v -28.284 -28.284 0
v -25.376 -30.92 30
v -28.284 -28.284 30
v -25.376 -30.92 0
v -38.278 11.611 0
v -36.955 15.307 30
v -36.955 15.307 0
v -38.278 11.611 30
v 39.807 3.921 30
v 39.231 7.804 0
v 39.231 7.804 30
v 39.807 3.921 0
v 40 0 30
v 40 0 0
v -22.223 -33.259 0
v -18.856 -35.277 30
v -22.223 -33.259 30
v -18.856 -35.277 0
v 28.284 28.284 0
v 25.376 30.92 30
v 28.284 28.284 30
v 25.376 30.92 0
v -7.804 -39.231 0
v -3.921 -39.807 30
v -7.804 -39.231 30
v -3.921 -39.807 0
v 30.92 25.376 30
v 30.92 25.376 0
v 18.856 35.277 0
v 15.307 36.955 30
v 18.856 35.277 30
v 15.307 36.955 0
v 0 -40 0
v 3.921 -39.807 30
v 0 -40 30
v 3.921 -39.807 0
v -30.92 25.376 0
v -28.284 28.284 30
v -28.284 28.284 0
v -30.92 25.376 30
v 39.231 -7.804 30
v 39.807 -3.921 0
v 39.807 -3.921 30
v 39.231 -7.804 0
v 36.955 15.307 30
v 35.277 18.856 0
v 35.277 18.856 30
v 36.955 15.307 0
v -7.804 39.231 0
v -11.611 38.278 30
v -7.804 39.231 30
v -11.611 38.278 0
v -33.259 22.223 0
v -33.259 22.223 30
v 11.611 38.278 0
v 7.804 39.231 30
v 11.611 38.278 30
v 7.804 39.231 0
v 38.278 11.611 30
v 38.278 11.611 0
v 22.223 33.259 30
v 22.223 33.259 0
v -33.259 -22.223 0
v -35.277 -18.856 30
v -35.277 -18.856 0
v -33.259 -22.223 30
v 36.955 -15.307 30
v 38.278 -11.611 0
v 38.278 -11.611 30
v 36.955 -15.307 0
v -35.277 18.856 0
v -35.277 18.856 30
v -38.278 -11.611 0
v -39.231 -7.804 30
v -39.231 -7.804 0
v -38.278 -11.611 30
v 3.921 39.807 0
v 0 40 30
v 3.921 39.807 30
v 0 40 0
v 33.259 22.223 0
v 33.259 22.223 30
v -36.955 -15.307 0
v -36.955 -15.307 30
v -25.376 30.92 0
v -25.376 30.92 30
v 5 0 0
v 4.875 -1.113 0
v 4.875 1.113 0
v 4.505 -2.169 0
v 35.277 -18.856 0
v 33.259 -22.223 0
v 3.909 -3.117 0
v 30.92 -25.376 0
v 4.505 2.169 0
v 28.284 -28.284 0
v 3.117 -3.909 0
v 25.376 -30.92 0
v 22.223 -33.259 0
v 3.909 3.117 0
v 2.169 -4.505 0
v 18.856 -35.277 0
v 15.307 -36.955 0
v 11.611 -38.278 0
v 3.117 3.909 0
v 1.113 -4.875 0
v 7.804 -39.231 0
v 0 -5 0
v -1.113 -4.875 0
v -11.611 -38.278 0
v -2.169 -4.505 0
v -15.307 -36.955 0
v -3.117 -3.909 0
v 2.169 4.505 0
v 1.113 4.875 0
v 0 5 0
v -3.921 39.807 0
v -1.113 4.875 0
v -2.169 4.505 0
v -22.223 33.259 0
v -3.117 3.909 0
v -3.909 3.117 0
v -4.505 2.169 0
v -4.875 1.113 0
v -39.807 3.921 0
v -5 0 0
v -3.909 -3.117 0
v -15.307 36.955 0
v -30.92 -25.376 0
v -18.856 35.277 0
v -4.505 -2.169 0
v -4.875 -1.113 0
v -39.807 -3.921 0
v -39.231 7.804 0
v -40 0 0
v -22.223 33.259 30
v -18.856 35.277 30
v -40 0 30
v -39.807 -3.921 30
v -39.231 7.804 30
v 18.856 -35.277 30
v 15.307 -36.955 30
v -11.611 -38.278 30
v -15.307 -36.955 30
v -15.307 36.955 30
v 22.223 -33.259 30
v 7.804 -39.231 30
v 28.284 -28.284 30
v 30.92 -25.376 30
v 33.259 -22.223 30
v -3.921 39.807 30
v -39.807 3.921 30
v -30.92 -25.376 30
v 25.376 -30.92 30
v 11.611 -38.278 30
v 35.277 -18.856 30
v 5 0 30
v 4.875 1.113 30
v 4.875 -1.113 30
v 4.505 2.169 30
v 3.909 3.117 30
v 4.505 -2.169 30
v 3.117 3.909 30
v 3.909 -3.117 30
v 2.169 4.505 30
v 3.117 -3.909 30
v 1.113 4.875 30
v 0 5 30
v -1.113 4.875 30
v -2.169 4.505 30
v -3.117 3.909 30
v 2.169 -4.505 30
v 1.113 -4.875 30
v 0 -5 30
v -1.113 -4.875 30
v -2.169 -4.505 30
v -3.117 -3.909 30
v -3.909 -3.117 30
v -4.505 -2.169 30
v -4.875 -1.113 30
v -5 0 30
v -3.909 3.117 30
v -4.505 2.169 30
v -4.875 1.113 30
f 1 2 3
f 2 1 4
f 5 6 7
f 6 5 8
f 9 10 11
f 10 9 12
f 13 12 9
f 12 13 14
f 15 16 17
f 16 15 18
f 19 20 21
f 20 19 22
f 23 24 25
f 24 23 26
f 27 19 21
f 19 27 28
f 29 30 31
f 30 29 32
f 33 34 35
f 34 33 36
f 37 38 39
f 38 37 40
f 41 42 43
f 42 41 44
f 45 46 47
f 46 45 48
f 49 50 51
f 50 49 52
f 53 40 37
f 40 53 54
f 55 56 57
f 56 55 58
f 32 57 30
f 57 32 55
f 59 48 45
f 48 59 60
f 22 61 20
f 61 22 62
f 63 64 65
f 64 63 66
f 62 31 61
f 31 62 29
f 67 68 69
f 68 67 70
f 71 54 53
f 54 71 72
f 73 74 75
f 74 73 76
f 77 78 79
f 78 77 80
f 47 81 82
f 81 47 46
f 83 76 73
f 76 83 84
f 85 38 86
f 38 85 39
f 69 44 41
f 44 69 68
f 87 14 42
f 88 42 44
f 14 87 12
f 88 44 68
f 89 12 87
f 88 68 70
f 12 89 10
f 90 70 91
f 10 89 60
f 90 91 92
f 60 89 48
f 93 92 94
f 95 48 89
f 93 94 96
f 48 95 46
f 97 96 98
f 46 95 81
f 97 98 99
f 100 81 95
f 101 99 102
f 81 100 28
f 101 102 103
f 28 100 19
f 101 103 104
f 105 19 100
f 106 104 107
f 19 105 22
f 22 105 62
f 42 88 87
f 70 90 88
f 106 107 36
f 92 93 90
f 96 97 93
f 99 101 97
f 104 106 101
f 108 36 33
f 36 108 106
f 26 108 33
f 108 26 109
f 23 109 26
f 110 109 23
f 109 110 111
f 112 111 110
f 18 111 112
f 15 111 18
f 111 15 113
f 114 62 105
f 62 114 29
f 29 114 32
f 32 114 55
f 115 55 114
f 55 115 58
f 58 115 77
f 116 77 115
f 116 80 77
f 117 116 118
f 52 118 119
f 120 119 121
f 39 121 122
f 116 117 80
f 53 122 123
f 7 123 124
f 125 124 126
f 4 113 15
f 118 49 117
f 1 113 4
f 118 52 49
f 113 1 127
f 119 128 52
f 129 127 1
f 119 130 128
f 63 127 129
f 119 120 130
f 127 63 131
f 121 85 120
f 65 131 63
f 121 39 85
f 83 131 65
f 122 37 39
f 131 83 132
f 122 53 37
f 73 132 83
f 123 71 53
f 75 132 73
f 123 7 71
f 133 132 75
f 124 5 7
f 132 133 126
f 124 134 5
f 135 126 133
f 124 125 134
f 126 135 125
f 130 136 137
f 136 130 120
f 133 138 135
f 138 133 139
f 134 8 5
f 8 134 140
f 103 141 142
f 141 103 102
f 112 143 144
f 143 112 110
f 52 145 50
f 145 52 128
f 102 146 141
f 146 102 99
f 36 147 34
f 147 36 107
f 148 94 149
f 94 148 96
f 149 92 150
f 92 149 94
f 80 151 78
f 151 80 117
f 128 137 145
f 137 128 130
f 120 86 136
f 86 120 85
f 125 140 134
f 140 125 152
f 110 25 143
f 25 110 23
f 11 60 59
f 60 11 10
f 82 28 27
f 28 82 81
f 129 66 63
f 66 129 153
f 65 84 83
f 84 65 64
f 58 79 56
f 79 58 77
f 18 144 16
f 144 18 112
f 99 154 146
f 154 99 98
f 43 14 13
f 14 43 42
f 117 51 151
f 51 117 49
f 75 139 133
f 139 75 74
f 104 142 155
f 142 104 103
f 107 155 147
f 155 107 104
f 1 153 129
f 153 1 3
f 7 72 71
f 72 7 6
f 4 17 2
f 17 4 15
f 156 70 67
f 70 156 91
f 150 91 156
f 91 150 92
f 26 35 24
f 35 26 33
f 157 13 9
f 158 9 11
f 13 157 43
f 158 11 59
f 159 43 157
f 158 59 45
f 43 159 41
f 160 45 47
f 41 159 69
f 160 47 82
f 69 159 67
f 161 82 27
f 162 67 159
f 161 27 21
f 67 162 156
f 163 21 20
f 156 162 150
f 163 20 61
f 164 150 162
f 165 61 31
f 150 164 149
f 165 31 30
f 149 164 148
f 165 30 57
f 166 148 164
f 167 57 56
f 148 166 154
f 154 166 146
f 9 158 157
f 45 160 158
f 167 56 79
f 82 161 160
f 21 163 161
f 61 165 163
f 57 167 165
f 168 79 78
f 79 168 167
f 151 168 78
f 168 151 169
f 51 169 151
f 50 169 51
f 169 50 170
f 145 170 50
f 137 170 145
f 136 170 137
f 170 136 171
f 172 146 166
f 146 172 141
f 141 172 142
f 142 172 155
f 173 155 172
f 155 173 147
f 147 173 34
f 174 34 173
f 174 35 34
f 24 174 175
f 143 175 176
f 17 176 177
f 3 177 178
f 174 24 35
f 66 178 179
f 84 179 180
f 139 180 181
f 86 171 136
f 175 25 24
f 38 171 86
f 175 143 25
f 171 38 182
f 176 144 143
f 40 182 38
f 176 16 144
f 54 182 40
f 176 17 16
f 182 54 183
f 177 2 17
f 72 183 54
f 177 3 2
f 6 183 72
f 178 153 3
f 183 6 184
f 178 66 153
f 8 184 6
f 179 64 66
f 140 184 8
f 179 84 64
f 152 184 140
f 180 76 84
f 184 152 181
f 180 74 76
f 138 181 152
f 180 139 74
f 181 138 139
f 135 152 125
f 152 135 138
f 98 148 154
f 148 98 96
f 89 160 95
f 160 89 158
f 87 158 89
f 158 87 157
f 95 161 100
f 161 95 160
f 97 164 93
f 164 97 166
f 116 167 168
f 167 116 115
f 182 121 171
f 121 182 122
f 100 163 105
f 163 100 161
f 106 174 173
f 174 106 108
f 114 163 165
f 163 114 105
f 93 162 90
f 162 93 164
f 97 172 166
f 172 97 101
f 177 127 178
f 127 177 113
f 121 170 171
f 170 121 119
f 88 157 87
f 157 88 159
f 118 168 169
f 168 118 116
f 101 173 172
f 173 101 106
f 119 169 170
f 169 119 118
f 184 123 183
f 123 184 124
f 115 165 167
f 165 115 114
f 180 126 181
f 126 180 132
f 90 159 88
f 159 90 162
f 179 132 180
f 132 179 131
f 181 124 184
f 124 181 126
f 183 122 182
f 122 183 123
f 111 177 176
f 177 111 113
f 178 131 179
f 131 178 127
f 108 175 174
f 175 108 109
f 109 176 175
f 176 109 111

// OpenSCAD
module mecanum_hub(d=80,w=30){
  difference(){
    cylinder(h=w,r=d/2,$fn=64);
    translate([0,0,-0.1]) cylinder(h=w+0.2,r=5,$fn=28);
  }
}
mecanum_hub();
